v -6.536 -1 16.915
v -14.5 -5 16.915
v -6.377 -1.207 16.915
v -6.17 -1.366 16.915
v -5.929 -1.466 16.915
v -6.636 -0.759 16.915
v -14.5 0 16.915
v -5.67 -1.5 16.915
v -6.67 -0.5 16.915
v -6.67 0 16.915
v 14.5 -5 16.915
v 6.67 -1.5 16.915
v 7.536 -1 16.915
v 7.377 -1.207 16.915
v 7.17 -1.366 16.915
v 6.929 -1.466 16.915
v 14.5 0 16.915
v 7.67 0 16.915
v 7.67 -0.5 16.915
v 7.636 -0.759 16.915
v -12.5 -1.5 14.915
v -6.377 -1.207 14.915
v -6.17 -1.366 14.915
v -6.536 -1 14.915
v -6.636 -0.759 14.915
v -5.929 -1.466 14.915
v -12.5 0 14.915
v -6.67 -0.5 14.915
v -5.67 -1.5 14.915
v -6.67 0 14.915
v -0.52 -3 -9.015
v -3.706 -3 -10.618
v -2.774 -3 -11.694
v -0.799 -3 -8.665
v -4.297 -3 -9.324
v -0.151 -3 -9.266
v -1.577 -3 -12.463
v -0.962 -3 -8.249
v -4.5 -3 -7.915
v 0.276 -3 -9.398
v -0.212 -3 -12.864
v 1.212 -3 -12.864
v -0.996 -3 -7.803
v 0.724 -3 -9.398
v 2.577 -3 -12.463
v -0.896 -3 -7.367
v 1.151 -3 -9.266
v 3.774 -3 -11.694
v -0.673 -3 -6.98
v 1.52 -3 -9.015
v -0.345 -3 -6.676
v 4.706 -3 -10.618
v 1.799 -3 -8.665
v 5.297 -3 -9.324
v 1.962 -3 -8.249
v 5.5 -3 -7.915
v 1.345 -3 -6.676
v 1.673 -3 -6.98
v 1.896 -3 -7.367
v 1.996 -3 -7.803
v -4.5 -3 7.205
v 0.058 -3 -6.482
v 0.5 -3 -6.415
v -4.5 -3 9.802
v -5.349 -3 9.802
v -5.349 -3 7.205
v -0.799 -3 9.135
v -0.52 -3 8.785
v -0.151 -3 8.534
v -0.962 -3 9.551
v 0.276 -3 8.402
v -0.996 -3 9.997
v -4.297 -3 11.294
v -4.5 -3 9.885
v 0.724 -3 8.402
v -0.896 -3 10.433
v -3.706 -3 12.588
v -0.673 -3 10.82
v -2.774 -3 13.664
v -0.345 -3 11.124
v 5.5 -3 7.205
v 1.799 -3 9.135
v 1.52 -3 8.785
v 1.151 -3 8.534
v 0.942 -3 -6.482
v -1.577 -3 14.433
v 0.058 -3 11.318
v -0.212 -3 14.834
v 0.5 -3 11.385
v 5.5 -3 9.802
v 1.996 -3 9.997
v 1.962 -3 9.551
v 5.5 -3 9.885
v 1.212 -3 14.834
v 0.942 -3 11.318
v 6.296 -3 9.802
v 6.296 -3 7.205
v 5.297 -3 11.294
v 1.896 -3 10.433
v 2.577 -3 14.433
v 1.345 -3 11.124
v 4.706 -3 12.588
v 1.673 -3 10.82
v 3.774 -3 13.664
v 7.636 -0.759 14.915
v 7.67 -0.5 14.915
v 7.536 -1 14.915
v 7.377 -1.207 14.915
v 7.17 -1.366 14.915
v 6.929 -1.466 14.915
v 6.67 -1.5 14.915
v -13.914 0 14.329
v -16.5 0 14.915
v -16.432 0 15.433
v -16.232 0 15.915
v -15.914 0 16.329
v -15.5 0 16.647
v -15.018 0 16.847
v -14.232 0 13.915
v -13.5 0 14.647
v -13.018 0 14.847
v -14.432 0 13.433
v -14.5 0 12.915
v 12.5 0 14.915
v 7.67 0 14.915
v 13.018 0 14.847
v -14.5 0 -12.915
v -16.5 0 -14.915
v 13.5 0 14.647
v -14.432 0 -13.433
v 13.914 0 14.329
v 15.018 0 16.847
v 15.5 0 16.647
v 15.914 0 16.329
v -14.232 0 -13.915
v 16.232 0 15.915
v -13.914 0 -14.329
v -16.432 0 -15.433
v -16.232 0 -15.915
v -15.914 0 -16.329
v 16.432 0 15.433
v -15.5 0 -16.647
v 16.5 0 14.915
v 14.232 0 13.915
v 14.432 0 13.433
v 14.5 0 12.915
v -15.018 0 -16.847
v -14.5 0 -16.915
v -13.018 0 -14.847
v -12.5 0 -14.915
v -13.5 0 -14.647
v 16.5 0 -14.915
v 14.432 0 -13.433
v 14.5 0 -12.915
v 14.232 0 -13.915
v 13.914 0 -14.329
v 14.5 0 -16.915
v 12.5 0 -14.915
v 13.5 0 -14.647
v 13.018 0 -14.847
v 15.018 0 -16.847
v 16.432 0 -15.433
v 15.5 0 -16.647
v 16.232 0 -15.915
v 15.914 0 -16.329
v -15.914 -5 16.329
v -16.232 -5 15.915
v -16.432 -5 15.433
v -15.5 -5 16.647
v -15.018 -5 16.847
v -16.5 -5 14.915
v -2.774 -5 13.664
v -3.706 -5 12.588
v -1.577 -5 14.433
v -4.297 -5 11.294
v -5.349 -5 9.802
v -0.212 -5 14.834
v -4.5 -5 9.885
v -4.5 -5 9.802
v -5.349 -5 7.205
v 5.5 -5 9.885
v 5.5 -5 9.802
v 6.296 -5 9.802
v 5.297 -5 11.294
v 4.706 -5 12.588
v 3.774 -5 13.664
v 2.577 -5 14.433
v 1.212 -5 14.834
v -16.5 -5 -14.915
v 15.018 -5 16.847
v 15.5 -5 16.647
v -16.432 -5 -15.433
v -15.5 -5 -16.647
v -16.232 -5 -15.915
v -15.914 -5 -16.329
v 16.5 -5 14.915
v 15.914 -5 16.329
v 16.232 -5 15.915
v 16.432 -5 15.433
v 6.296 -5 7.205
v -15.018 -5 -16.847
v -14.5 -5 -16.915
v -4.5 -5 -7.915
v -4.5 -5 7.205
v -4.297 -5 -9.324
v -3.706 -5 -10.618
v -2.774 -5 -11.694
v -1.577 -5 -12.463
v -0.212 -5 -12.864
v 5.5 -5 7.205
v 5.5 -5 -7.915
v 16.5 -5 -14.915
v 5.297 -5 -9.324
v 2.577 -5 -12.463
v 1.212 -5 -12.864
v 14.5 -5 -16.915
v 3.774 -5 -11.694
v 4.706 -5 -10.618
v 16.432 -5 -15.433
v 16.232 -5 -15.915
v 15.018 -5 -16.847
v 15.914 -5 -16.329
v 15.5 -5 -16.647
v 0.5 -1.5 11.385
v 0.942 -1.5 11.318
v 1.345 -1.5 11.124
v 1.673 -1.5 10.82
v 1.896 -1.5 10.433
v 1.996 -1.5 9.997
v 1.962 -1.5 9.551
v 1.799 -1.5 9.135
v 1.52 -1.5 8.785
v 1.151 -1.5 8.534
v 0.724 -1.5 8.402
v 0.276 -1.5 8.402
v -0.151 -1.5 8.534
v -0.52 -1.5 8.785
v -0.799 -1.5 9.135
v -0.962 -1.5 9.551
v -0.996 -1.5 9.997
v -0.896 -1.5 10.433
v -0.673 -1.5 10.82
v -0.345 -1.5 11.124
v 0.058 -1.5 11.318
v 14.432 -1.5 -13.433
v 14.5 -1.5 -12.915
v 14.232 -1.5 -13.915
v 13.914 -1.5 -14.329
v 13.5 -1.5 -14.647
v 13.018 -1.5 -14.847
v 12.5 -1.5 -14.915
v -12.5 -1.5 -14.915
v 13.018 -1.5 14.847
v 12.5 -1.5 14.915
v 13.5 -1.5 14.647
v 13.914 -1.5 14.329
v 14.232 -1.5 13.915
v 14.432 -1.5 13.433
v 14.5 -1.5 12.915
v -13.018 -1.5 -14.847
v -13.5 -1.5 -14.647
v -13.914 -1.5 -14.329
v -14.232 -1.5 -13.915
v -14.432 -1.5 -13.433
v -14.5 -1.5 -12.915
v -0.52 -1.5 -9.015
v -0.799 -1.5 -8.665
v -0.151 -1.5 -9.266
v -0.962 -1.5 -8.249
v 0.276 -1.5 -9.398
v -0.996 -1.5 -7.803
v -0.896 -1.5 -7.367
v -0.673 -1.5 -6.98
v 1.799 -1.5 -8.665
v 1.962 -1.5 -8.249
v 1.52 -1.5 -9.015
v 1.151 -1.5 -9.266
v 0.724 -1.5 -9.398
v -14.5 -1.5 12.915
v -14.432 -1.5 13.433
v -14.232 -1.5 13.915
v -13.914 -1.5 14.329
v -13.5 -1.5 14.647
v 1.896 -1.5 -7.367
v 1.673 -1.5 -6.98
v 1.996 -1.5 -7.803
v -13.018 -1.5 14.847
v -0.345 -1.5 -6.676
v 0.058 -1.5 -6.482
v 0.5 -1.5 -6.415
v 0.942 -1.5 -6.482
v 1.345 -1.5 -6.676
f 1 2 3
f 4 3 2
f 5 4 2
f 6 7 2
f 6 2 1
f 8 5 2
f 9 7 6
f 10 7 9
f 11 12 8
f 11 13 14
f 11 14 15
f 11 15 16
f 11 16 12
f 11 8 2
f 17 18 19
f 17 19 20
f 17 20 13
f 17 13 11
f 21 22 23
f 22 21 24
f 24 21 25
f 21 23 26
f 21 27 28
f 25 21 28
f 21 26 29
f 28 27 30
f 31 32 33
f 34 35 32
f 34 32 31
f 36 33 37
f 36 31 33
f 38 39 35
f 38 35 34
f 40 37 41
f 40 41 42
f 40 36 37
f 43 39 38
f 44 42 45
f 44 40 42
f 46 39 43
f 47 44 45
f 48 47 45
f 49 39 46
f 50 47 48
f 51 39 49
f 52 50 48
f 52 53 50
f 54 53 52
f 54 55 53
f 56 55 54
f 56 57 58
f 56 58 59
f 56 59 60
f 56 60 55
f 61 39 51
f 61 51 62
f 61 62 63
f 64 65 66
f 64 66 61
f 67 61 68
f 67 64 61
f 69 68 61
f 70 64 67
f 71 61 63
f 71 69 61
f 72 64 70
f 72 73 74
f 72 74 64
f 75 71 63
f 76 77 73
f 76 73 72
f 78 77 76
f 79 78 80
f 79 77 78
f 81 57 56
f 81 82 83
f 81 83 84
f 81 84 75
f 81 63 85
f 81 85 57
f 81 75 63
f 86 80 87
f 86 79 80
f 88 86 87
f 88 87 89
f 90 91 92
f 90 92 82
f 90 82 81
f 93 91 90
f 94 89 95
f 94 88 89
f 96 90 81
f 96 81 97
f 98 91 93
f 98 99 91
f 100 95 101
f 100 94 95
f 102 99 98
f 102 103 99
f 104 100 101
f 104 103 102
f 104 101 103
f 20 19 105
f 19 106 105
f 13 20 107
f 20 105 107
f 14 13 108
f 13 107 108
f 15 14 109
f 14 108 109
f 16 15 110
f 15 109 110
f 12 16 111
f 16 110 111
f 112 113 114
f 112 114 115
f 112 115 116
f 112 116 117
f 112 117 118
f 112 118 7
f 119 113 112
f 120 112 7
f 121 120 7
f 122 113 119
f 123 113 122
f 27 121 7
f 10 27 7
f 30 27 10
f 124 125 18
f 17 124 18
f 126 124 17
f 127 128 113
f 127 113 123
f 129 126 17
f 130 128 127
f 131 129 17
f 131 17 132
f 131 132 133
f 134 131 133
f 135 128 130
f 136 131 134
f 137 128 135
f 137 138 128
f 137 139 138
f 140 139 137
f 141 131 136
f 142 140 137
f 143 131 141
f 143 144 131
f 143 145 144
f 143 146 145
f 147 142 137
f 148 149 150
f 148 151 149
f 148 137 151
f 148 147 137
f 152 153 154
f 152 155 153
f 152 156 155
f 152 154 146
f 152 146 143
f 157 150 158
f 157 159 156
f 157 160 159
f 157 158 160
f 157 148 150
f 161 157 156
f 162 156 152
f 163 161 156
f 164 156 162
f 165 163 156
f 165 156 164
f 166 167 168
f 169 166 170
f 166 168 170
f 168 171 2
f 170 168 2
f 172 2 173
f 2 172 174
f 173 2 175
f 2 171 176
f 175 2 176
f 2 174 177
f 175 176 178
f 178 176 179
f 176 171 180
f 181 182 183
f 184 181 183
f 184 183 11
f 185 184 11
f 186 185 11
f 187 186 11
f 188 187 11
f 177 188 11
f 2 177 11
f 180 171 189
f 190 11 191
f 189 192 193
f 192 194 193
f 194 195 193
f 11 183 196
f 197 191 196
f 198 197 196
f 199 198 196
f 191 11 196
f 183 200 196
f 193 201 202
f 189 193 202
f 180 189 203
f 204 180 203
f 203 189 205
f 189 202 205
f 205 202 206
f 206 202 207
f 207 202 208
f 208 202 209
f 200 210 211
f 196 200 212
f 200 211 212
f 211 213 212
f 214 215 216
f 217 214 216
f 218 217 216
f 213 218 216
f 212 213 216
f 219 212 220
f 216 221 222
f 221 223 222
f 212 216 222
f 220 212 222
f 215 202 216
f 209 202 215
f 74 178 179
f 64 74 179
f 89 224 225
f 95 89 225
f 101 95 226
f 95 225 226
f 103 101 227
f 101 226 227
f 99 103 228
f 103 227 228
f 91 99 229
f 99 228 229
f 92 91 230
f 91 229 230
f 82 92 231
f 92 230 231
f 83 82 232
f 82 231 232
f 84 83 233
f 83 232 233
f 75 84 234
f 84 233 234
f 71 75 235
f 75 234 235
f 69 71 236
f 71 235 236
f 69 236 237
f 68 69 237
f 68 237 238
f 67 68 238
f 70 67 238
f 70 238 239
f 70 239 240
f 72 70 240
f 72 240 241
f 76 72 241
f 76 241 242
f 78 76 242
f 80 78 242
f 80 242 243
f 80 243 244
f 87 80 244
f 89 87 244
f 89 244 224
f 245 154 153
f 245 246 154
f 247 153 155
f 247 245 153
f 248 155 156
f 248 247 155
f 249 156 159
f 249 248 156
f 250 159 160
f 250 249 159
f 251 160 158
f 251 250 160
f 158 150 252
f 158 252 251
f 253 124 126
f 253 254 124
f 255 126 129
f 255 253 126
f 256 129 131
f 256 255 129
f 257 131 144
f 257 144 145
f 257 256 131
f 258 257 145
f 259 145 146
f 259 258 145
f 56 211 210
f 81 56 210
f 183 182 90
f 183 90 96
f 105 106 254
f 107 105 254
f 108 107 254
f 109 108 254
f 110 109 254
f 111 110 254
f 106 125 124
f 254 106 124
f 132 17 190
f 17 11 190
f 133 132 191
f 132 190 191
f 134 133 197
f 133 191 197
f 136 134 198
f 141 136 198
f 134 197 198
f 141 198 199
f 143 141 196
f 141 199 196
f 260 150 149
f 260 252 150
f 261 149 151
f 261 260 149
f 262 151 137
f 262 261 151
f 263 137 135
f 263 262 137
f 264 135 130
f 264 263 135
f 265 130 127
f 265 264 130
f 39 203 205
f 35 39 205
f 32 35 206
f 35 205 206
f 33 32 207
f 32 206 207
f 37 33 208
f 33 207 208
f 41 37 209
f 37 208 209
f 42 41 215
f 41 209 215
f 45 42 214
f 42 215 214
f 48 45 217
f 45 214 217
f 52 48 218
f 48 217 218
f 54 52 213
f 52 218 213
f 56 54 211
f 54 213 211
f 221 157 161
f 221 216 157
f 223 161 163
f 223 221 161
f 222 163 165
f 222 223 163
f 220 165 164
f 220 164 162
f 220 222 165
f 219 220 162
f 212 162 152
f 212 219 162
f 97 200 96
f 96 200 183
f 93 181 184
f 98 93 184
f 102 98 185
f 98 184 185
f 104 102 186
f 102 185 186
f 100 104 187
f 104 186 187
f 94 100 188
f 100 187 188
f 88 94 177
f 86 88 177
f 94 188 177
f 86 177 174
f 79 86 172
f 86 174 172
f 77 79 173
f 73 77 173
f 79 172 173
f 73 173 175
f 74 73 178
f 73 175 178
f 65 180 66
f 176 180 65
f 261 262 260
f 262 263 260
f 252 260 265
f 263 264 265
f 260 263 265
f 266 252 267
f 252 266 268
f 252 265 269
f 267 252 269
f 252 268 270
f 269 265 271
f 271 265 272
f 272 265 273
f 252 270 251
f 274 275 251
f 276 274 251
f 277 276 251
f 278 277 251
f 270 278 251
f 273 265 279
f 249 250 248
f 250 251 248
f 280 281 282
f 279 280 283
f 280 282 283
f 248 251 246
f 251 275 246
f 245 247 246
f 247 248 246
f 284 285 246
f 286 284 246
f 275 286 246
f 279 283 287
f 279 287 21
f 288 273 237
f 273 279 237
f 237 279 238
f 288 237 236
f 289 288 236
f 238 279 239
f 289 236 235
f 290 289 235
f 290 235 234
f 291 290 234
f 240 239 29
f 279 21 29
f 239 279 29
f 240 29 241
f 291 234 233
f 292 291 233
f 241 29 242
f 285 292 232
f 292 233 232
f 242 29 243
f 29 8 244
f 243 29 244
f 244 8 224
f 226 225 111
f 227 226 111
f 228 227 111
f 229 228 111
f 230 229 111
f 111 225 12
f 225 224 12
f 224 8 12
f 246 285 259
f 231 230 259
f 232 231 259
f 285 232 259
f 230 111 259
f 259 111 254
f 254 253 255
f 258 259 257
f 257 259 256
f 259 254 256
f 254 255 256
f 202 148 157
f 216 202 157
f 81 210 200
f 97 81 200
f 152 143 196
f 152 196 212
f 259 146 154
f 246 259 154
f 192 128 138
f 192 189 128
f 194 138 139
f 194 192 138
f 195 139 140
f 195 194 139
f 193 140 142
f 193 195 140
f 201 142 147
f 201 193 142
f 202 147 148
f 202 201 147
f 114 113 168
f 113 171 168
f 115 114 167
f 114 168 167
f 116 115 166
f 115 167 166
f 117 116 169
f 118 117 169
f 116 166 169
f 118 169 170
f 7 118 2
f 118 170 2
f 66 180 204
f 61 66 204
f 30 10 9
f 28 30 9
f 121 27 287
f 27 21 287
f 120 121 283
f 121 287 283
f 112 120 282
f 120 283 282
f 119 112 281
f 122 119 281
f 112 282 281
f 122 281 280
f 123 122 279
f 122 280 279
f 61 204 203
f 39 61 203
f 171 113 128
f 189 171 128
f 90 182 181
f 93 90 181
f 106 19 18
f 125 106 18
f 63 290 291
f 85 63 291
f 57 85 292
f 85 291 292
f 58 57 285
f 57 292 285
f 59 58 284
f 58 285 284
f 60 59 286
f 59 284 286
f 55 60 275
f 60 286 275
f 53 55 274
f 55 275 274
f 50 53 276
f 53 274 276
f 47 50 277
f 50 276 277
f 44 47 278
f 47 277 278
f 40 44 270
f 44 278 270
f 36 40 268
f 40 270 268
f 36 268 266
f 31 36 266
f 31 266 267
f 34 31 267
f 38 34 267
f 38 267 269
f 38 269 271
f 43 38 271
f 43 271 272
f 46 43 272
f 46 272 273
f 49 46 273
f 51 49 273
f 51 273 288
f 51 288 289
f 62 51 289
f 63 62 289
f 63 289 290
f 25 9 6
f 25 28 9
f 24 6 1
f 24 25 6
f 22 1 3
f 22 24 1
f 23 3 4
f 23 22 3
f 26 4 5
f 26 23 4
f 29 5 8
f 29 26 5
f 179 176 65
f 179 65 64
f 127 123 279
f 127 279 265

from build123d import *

# Parameters (mm, degrees)
SKETCH1_W           = 33
SKETCH1_H           = 33.83
BOSS_EXTRUDE1_DEPTH = 5
SKETCH2_W           = 29
SKETCH2_H           = 29.83
CUT_EXTRUDE1_DEPTH  = 1.5
SKETCH3_R           = 1.5
CUT_EXTRUDE3_DEPTH  = 31
CUT_EXTRUDE4_DEPTH  = 2
FILLET1_R           = 2
SKETCH5_W           = 11.644842875
SKETCH5_H           = 2.596903013
CUT_EXTRUDE5_DEPTH  = 2
CUT_EXTRUDE9_DEPTH  = 10
FILLET5_R           = 1
FILLET6_R           = 1


with BuildPart() as part:
    # Sketch1 → Boss-Extrude1 (new body)
    with BuildSketch(Plane(origin=(0, 0, 0), x_dir=(1, 0, 0), z_dir=(0, 1, 0))):
        Rectangle(SKETCH1_W, SKETCH1_H)
    extrude(amount=-BOSS_EXTRUDE1_DEPTH)

    # Sketch2 → Cut-Extrude1 (cut)
    with BuildSketch(Plane(origin=(0, 0, 0), x_dir=(1, 0, 0), z_dir=(0, 1, 0))):
        Rectangle(SKETCH2_W, SKETCH2_H)
    extrude(amount=-CUT_EXTRUDE1_DEPTH, mode=Mode.SUBTRACT)

    # Sketch3 → Cut-Extrude3 (cut)
    with BuildSketch(Plane(origin=(0, 0, 0), x_dir=(1, 0, 0), z_dir=(0, 1, 0))):
        with Locations((0.5, 7.915)):
            Circle(SKETCH3_R)
        with Locations((0.5, -9.885)):
            Circle(SKETCH3_R)
    extrude(amount=-CUT_EXTRUDE3_DEPTH, mode=Mode.SUBTRACT)

    # Sketch4 → Cut-Extrude4 (cut)
    with BuildSketch(Plane.XZ.offset(5)):
        with BuildLine():
            Line((-4.5, 9.885), (-4.5, -7.915))
            ThreePointArc((-4.5, -7.915), (0.5, -12.915), (5.5, -7.915))
            Line((5.5, -7.915), (5.5, 9.885))
            ThreePointArc((5.5, 9.885), (0.5, 14.885), (-4.5, 9.885))
        make_face()
    extrude(amount=-CUT_EXTRUDE4_DEPTH, mode=Mode.SUBTRACT)

    # Fillet1
    fillet1_edges = [part.edges().sort_by_distance(p)[0] for p in [
        (14.5, -0.75, -14.915),
        (14.5, -0.75, 14.915),
        (-14.5, -0.75, 14.915),
        (-16.5, -2.5, 16.915),
        (-16.5, -2.5, -16.915),
        (-14.5, -0.75, -14.915),
        (16.5, -2.5, -16.915),
        (16.5, -2.5, 16.915),
    ]]
    fillet(fillet1_edges, radius=FILLET1_R)

    # Sketch5 → Cut-Extrude5 (cut)
    with BuildSketch(Plane.XZ.offset(5)):
        with Locations((0.473449804, 8.503582245)):
            Rectangle(SKETCH5_W, SKETCH5_H)
    extrude(amount=-CUT_EXTRUDE5_DEPTH, mode=Mode.SUBTRACT)

    # Sketch7 → Cut-Extrude9 (cut)
    with BuildSketch(Plane.XY.offset(16.915)):
        Polygon((0.5, 0), (-6.67, 0), (-6.67, -1.5), (7.67, -1.5), (7.67, 0), align=None)
    extrude(amount=-CUT_EXTRUDE9_DEPTH, mode=Mode.SUBTRACT)

    # Fillet5
    fillet5_edges = [part.edges().sort_by_distance(p)[0] for p in [
        (-6.67, -1.5, 15.915),
    ]]
    fillet(fillet5_edges, radius=FILLET5_R)

    # Fillet6
    fillet6_edges = [part.edges().sort_by_distance(p)[0] for p in [
        (7.67, -1.5, 15.915),
    ]]
    fillet(fillet6_edges, radius=FILLET6_R)


solid = part.part
